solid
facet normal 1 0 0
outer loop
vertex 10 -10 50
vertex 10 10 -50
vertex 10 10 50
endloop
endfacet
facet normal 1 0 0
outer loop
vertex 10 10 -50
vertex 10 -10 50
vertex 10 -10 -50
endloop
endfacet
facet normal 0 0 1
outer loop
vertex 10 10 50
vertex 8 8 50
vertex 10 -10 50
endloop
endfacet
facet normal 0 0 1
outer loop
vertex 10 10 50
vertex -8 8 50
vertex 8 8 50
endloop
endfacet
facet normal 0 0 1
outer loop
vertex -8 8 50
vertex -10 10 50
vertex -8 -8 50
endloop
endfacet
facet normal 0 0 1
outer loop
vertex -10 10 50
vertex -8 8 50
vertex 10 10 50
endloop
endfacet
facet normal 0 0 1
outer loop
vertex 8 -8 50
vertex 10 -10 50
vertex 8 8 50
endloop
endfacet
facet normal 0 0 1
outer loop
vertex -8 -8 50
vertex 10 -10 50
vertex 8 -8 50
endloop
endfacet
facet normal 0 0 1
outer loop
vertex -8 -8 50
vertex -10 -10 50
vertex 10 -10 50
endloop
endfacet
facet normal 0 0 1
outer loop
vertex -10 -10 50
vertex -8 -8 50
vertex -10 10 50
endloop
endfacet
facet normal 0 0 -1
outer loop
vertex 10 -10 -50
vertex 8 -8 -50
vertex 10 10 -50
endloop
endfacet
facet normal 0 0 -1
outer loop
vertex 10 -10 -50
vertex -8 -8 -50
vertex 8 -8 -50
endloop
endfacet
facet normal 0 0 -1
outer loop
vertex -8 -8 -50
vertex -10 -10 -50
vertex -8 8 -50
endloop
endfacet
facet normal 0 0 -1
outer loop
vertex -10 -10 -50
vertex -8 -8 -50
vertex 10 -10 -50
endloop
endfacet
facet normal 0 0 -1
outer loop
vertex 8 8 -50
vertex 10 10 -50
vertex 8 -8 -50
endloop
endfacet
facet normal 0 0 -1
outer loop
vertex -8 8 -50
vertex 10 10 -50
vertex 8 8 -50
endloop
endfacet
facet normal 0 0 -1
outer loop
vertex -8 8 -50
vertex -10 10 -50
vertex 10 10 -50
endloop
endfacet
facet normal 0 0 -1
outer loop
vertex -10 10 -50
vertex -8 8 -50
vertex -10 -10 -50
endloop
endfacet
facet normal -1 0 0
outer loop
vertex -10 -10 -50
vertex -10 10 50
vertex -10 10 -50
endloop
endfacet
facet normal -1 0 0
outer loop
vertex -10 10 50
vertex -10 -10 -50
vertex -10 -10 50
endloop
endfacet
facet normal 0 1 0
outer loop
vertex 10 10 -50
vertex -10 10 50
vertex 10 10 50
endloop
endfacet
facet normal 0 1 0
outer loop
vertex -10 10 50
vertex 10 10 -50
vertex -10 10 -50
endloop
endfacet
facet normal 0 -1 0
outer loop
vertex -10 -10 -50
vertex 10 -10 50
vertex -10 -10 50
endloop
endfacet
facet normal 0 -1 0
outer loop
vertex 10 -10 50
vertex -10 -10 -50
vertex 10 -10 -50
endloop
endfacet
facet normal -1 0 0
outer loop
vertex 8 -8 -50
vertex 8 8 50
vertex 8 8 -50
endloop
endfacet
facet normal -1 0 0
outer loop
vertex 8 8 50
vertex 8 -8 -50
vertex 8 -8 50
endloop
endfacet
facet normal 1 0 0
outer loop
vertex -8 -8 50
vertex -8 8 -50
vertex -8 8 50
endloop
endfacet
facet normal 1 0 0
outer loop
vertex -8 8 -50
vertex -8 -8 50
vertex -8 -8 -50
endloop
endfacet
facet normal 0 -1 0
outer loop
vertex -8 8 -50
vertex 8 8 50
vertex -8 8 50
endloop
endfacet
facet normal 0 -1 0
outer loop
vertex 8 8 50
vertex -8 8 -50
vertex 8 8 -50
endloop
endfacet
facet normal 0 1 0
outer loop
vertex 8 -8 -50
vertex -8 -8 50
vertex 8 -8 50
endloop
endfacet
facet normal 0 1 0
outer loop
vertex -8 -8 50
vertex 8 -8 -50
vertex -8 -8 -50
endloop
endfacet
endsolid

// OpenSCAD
$fn = 64;

// Aluminium rectangular box section: 20mm x 20mm x 2mm wall
outer_w = 20;
outer_h = 20;
wall    = 2;
length  = 100; // mm

inner_w = outer_w - 2*wall;
inner_h = outer_h - 2*wall;

eps = 0.05; // small extra to ensure clean boolean cut

// Guard against invalid dimensions
assert(inner_w > 0 && inner_h > 0, "Wall thickness too large for given outer dimensions.");

difference() {
    // Outer tube
    cube([outer_w, outer_h, length], center=true);

    // Inner void (open ends), extended along length to guarantee through-cut
    cube([inner_w, inner_h, length + 2*eps], center=true);
}
